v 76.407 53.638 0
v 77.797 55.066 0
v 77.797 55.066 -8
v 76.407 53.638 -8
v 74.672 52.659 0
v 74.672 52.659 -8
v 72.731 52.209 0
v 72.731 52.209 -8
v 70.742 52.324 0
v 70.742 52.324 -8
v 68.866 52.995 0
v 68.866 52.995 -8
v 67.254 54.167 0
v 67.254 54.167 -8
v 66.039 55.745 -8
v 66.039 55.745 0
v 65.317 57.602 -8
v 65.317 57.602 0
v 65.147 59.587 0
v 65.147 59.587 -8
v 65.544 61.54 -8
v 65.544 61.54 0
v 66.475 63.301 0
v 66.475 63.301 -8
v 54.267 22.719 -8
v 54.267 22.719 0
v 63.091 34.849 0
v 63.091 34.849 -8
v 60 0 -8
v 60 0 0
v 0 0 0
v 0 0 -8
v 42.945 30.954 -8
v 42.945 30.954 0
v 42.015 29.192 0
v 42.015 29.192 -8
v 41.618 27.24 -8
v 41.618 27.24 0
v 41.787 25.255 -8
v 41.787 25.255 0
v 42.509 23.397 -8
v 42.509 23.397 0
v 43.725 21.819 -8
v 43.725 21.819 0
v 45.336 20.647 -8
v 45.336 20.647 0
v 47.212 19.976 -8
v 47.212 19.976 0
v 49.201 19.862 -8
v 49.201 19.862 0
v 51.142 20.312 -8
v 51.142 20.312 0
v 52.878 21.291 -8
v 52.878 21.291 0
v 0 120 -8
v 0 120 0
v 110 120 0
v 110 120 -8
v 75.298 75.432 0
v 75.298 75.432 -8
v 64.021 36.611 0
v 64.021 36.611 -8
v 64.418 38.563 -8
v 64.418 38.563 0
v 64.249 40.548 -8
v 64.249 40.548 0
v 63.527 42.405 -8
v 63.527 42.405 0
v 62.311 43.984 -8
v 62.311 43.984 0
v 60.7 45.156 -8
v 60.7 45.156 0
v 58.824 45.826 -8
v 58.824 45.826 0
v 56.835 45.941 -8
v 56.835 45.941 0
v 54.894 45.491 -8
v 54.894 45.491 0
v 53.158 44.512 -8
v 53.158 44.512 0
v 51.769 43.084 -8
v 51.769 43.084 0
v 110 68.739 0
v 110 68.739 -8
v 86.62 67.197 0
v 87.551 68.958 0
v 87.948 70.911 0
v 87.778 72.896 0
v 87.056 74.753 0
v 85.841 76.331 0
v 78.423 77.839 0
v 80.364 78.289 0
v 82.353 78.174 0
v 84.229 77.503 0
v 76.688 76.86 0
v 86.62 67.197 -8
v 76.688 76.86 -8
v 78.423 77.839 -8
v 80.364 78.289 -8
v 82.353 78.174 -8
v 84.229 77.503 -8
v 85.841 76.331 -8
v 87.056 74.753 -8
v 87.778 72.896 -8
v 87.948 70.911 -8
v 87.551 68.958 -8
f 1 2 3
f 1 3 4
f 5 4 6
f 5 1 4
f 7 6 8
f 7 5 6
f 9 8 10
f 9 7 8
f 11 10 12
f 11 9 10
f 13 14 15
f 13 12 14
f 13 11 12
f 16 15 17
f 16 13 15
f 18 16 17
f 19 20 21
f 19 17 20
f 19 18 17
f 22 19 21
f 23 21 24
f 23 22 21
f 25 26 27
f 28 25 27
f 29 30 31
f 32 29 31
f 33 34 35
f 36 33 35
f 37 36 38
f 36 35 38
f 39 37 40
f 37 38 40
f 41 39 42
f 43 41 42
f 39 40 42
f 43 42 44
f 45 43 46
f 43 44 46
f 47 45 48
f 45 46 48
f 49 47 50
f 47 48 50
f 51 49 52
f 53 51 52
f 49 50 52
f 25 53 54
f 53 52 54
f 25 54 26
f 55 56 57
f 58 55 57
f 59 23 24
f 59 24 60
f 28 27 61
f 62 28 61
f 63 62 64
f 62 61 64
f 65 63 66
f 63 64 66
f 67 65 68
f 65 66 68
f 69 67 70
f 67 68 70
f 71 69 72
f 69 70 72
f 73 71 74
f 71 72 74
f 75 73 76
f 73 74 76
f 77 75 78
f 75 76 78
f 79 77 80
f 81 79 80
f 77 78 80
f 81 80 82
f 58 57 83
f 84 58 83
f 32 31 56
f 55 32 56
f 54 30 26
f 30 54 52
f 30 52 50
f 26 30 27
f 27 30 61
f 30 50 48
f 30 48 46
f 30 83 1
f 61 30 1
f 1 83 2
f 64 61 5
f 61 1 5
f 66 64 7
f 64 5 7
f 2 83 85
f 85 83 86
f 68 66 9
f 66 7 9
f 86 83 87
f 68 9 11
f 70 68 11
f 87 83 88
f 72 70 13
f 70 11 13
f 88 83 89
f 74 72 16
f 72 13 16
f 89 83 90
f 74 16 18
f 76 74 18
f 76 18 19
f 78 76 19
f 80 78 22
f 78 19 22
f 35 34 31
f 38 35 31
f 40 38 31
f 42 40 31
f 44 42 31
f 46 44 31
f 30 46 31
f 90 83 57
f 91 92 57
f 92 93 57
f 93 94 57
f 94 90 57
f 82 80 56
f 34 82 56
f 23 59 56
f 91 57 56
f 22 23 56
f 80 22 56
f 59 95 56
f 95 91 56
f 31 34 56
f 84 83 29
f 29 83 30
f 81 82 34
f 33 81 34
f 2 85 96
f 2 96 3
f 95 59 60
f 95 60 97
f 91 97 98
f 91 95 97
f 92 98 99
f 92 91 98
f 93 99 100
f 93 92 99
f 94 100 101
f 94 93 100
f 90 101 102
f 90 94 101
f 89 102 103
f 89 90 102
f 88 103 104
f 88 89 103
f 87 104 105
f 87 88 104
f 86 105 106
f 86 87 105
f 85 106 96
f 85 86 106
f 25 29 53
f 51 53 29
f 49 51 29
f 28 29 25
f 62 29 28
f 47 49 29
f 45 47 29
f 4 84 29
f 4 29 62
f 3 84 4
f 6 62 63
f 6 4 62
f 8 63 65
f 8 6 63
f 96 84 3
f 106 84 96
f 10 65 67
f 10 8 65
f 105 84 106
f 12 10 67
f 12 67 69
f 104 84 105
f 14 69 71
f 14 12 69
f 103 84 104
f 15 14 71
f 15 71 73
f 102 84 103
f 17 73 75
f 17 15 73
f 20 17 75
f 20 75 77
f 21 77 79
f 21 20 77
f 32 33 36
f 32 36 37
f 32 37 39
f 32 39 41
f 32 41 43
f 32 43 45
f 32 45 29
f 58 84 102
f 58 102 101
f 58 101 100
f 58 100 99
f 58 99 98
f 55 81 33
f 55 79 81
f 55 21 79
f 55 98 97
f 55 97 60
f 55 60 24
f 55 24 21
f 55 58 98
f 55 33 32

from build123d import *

# Parameters (mm, degrees)
SM_BASE_FLANGE_1_DEPTH = 8
CUT_EXTRUDE_1_DEPTH    = 10


# Sheet-metal steps are written as plain solids
with BuildPart() as part:
    # Sketch 1 → Базовая кромка1 (new body)
    with BuildSketch(Plane.XY):
        Polygon((0, 0), (0, 120), (110, 120), (110, 68.738635424), (60, 0), align=None)
    extrude(amount=-SM_BASE_FLANGE_1_DEPTH)

    # Эскиз6 → Вырез-Вытянуть1 (cut)
    with BuildSketch(Plane.XY):
        with BuildLine():
            Line((66.474866664, 63.30146998), (75.298396076, 75.431817408))
            ThreePointArc((75.298396076, 75.431817408), (85.076871934, 76.974999149), (86.620053675, 67.196523291))
            Line((86.620053675, 67.196523291), (77.796524263, 55.066175863))
            ThreePointArc((77.796524263, 55.066175863), (68.018048405, 53.522994122), (66.474866664, 63.30146998))
        make_face()
        with BuildLine():
            Line((51.768984311, 43.084224267), (42.945454899, 30.95387684))
            ThreePointArc((42.945454899, 30.95387684), (44.48863664, 21.175400981), (54.267112498, 22.718582722))
            Line((54.267112498, 22.718582722), (63.09064191, 34.84893015))
            ThreePointArc((63.09064191, 34.84893015), (61.547460169, 44.627406008), (51.768984311, 43.084224267))
        make_face()
    extrude(amount=-CUT_EXTRUDE_1_DEPTH, mode=Mode.SUBTRACT)


solid = part.part
